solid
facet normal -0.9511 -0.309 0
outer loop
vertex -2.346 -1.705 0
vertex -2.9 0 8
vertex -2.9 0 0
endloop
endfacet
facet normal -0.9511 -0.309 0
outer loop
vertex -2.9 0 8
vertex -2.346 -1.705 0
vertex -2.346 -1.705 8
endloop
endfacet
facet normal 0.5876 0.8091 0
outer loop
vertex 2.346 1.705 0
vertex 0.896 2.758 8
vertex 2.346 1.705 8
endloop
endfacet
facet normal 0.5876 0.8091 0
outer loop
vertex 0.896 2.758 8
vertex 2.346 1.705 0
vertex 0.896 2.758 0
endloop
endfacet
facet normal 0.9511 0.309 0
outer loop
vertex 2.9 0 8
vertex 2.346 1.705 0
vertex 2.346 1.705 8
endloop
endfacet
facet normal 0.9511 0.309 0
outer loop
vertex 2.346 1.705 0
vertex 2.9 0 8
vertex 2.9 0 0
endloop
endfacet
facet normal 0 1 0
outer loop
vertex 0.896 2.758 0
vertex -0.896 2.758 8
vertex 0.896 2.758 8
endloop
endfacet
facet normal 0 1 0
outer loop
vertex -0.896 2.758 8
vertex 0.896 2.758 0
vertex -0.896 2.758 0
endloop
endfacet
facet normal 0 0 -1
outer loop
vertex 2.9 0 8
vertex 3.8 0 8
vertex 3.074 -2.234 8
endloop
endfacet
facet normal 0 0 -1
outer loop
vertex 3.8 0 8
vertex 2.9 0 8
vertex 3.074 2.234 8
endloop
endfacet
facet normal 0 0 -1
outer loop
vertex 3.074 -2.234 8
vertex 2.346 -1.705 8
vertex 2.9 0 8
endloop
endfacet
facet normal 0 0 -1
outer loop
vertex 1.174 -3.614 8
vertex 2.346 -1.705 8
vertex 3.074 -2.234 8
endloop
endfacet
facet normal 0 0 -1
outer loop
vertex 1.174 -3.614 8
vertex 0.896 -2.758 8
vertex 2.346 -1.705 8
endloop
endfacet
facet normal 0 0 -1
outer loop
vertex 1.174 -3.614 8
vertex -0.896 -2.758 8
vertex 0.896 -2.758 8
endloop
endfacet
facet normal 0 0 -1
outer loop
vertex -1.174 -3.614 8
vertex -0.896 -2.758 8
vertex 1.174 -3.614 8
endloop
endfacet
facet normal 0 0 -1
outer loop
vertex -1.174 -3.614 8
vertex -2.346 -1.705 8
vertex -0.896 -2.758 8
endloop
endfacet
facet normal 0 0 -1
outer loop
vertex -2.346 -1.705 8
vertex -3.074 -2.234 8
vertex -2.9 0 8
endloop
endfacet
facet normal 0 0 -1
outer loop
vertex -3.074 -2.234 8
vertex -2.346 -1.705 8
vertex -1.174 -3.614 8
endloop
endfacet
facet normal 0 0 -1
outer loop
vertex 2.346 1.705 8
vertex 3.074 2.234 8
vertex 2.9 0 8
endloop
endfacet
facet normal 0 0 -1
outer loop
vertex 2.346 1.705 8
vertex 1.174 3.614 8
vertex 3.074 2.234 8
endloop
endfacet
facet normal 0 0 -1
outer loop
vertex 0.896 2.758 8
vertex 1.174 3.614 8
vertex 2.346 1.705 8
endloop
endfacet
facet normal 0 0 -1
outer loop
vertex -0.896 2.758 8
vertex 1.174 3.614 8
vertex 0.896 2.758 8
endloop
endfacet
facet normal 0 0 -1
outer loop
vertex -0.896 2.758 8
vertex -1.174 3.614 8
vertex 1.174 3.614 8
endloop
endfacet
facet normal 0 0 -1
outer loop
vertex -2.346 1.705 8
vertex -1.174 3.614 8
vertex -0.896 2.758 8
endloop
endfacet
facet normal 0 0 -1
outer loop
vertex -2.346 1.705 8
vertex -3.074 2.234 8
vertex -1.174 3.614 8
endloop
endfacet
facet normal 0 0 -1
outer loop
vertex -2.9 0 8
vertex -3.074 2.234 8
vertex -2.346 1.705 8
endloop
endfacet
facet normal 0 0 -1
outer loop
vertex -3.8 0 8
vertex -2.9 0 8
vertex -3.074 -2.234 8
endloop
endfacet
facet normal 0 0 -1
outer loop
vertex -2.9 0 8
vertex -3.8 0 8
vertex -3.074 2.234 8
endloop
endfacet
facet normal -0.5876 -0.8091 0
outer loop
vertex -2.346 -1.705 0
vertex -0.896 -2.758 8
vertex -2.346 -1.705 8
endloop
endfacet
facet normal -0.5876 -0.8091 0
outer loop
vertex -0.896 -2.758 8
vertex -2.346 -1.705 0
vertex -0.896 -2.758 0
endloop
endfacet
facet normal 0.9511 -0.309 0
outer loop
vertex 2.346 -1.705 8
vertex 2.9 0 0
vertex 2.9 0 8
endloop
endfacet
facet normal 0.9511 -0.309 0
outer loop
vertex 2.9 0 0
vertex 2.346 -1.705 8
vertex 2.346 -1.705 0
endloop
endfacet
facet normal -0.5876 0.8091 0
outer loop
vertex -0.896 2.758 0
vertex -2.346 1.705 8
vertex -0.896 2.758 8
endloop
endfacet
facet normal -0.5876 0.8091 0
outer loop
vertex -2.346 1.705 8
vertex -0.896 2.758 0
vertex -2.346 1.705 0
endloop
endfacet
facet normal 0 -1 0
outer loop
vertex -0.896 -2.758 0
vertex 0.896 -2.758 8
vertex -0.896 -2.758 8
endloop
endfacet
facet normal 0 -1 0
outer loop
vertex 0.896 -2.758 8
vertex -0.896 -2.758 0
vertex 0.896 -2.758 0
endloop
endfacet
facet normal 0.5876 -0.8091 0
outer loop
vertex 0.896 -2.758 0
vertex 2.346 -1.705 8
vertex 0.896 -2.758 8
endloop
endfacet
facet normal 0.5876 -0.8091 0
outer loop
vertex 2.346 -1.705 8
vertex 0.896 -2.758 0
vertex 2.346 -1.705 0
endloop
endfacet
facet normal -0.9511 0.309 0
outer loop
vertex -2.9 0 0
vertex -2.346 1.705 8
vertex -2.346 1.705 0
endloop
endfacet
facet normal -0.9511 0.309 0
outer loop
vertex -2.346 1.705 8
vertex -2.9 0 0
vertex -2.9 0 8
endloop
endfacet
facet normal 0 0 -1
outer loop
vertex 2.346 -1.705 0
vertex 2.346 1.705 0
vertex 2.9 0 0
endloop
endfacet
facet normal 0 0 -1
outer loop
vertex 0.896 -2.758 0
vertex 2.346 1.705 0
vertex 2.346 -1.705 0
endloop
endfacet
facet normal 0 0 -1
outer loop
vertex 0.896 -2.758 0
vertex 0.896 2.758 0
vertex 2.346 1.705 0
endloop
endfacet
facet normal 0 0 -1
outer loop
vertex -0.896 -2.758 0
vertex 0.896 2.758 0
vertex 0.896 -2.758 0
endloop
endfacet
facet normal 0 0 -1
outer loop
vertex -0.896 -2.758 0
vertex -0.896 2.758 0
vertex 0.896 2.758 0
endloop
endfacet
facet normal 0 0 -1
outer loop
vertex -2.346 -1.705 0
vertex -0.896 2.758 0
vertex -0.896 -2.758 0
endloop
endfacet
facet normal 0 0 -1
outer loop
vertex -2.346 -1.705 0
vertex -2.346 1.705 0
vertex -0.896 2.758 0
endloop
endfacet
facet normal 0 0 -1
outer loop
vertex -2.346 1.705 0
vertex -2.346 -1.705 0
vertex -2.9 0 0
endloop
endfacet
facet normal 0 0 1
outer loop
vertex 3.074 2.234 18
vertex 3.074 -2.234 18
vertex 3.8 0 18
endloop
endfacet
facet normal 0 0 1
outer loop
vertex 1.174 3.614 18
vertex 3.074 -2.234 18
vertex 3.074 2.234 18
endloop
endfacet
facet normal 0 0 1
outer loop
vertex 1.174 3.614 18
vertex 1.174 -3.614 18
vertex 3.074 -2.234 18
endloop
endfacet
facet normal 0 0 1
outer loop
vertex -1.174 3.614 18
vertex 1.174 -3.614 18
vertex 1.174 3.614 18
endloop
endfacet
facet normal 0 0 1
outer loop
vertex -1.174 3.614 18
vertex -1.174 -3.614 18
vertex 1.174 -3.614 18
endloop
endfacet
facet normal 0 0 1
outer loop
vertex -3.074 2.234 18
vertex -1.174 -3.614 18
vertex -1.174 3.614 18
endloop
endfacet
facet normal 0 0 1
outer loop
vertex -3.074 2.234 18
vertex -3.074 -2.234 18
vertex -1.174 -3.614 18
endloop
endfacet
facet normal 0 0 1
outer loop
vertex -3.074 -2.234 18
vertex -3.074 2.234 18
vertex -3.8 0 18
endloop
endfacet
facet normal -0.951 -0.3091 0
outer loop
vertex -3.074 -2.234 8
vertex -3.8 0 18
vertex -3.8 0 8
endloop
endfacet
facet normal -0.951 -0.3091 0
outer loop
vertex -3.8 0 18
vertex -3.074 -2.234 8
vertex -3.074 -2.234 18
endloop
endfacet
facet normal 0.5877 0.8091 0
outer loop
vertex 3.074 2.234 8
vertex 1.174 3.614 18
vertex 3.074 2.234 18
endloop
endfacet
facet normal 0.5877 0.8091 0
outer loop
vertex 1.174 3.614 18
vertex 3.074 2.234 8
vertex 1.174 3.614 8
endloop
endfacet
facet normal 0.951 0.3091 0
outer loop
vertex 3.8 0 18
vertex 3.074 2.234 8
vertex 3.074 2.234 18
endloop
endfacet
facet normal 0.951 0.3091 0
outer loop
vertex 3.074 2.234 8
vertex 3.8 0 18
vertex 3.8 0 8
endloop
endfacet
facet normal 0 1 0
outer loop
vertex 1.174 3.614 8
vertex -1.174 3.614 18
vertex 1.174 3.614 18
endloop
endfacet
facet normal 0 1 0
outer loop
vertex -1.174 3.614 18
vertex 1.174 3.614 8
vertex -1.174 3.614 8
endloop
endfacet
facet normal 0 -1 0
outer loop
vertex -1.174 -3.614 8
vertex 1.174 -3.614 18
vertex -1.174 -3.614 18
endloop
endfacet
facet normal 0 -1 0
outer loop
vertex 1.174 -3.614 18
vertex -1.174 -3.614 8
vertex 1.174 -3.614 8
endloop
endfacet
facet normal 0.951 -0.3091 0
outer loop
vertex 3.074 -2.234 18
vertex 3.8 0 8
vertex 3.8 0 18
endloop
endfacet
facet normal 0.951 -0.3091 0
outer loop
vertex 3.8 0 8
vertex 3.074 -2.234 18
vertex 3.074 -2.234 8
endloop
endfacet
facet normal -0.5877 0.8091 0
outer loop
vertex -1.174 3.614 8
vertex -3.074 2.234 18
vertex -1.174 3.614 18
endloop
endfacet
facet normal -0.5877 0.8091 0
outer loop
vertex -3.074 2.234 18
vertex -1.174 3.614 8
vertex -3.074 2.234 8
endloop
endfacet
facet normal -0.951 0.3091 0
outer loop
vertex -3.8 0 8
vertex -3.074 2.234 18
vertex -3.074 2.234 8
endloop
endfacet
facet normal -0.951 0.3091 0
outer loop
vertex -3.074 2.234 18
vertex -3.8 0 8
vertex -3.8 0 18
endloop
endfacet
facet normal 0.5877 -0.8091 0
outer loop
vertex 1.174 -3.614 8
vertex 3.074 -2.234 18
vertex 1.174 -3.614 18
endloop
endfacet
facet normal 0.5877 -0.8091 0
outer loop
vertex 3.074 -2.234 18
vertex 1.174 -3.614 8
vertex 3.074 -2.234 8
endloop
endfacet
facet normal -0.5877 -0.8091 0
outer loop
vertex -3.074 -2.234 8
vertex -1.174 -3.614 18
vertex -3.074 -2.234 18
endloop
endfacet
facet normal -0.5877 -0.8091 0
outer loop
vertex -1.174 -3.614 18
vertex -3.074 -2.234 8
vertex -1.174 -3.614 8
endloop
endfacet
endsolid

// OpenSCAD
//BoeeblBadschrank
$fn=10;

h1=8;
d1=5.8;

h2=10;
d2=7.6;

cylinder(h=h1, d=d1);
translate([0,0,h1])
cylinder(h=h2, d=d2);
